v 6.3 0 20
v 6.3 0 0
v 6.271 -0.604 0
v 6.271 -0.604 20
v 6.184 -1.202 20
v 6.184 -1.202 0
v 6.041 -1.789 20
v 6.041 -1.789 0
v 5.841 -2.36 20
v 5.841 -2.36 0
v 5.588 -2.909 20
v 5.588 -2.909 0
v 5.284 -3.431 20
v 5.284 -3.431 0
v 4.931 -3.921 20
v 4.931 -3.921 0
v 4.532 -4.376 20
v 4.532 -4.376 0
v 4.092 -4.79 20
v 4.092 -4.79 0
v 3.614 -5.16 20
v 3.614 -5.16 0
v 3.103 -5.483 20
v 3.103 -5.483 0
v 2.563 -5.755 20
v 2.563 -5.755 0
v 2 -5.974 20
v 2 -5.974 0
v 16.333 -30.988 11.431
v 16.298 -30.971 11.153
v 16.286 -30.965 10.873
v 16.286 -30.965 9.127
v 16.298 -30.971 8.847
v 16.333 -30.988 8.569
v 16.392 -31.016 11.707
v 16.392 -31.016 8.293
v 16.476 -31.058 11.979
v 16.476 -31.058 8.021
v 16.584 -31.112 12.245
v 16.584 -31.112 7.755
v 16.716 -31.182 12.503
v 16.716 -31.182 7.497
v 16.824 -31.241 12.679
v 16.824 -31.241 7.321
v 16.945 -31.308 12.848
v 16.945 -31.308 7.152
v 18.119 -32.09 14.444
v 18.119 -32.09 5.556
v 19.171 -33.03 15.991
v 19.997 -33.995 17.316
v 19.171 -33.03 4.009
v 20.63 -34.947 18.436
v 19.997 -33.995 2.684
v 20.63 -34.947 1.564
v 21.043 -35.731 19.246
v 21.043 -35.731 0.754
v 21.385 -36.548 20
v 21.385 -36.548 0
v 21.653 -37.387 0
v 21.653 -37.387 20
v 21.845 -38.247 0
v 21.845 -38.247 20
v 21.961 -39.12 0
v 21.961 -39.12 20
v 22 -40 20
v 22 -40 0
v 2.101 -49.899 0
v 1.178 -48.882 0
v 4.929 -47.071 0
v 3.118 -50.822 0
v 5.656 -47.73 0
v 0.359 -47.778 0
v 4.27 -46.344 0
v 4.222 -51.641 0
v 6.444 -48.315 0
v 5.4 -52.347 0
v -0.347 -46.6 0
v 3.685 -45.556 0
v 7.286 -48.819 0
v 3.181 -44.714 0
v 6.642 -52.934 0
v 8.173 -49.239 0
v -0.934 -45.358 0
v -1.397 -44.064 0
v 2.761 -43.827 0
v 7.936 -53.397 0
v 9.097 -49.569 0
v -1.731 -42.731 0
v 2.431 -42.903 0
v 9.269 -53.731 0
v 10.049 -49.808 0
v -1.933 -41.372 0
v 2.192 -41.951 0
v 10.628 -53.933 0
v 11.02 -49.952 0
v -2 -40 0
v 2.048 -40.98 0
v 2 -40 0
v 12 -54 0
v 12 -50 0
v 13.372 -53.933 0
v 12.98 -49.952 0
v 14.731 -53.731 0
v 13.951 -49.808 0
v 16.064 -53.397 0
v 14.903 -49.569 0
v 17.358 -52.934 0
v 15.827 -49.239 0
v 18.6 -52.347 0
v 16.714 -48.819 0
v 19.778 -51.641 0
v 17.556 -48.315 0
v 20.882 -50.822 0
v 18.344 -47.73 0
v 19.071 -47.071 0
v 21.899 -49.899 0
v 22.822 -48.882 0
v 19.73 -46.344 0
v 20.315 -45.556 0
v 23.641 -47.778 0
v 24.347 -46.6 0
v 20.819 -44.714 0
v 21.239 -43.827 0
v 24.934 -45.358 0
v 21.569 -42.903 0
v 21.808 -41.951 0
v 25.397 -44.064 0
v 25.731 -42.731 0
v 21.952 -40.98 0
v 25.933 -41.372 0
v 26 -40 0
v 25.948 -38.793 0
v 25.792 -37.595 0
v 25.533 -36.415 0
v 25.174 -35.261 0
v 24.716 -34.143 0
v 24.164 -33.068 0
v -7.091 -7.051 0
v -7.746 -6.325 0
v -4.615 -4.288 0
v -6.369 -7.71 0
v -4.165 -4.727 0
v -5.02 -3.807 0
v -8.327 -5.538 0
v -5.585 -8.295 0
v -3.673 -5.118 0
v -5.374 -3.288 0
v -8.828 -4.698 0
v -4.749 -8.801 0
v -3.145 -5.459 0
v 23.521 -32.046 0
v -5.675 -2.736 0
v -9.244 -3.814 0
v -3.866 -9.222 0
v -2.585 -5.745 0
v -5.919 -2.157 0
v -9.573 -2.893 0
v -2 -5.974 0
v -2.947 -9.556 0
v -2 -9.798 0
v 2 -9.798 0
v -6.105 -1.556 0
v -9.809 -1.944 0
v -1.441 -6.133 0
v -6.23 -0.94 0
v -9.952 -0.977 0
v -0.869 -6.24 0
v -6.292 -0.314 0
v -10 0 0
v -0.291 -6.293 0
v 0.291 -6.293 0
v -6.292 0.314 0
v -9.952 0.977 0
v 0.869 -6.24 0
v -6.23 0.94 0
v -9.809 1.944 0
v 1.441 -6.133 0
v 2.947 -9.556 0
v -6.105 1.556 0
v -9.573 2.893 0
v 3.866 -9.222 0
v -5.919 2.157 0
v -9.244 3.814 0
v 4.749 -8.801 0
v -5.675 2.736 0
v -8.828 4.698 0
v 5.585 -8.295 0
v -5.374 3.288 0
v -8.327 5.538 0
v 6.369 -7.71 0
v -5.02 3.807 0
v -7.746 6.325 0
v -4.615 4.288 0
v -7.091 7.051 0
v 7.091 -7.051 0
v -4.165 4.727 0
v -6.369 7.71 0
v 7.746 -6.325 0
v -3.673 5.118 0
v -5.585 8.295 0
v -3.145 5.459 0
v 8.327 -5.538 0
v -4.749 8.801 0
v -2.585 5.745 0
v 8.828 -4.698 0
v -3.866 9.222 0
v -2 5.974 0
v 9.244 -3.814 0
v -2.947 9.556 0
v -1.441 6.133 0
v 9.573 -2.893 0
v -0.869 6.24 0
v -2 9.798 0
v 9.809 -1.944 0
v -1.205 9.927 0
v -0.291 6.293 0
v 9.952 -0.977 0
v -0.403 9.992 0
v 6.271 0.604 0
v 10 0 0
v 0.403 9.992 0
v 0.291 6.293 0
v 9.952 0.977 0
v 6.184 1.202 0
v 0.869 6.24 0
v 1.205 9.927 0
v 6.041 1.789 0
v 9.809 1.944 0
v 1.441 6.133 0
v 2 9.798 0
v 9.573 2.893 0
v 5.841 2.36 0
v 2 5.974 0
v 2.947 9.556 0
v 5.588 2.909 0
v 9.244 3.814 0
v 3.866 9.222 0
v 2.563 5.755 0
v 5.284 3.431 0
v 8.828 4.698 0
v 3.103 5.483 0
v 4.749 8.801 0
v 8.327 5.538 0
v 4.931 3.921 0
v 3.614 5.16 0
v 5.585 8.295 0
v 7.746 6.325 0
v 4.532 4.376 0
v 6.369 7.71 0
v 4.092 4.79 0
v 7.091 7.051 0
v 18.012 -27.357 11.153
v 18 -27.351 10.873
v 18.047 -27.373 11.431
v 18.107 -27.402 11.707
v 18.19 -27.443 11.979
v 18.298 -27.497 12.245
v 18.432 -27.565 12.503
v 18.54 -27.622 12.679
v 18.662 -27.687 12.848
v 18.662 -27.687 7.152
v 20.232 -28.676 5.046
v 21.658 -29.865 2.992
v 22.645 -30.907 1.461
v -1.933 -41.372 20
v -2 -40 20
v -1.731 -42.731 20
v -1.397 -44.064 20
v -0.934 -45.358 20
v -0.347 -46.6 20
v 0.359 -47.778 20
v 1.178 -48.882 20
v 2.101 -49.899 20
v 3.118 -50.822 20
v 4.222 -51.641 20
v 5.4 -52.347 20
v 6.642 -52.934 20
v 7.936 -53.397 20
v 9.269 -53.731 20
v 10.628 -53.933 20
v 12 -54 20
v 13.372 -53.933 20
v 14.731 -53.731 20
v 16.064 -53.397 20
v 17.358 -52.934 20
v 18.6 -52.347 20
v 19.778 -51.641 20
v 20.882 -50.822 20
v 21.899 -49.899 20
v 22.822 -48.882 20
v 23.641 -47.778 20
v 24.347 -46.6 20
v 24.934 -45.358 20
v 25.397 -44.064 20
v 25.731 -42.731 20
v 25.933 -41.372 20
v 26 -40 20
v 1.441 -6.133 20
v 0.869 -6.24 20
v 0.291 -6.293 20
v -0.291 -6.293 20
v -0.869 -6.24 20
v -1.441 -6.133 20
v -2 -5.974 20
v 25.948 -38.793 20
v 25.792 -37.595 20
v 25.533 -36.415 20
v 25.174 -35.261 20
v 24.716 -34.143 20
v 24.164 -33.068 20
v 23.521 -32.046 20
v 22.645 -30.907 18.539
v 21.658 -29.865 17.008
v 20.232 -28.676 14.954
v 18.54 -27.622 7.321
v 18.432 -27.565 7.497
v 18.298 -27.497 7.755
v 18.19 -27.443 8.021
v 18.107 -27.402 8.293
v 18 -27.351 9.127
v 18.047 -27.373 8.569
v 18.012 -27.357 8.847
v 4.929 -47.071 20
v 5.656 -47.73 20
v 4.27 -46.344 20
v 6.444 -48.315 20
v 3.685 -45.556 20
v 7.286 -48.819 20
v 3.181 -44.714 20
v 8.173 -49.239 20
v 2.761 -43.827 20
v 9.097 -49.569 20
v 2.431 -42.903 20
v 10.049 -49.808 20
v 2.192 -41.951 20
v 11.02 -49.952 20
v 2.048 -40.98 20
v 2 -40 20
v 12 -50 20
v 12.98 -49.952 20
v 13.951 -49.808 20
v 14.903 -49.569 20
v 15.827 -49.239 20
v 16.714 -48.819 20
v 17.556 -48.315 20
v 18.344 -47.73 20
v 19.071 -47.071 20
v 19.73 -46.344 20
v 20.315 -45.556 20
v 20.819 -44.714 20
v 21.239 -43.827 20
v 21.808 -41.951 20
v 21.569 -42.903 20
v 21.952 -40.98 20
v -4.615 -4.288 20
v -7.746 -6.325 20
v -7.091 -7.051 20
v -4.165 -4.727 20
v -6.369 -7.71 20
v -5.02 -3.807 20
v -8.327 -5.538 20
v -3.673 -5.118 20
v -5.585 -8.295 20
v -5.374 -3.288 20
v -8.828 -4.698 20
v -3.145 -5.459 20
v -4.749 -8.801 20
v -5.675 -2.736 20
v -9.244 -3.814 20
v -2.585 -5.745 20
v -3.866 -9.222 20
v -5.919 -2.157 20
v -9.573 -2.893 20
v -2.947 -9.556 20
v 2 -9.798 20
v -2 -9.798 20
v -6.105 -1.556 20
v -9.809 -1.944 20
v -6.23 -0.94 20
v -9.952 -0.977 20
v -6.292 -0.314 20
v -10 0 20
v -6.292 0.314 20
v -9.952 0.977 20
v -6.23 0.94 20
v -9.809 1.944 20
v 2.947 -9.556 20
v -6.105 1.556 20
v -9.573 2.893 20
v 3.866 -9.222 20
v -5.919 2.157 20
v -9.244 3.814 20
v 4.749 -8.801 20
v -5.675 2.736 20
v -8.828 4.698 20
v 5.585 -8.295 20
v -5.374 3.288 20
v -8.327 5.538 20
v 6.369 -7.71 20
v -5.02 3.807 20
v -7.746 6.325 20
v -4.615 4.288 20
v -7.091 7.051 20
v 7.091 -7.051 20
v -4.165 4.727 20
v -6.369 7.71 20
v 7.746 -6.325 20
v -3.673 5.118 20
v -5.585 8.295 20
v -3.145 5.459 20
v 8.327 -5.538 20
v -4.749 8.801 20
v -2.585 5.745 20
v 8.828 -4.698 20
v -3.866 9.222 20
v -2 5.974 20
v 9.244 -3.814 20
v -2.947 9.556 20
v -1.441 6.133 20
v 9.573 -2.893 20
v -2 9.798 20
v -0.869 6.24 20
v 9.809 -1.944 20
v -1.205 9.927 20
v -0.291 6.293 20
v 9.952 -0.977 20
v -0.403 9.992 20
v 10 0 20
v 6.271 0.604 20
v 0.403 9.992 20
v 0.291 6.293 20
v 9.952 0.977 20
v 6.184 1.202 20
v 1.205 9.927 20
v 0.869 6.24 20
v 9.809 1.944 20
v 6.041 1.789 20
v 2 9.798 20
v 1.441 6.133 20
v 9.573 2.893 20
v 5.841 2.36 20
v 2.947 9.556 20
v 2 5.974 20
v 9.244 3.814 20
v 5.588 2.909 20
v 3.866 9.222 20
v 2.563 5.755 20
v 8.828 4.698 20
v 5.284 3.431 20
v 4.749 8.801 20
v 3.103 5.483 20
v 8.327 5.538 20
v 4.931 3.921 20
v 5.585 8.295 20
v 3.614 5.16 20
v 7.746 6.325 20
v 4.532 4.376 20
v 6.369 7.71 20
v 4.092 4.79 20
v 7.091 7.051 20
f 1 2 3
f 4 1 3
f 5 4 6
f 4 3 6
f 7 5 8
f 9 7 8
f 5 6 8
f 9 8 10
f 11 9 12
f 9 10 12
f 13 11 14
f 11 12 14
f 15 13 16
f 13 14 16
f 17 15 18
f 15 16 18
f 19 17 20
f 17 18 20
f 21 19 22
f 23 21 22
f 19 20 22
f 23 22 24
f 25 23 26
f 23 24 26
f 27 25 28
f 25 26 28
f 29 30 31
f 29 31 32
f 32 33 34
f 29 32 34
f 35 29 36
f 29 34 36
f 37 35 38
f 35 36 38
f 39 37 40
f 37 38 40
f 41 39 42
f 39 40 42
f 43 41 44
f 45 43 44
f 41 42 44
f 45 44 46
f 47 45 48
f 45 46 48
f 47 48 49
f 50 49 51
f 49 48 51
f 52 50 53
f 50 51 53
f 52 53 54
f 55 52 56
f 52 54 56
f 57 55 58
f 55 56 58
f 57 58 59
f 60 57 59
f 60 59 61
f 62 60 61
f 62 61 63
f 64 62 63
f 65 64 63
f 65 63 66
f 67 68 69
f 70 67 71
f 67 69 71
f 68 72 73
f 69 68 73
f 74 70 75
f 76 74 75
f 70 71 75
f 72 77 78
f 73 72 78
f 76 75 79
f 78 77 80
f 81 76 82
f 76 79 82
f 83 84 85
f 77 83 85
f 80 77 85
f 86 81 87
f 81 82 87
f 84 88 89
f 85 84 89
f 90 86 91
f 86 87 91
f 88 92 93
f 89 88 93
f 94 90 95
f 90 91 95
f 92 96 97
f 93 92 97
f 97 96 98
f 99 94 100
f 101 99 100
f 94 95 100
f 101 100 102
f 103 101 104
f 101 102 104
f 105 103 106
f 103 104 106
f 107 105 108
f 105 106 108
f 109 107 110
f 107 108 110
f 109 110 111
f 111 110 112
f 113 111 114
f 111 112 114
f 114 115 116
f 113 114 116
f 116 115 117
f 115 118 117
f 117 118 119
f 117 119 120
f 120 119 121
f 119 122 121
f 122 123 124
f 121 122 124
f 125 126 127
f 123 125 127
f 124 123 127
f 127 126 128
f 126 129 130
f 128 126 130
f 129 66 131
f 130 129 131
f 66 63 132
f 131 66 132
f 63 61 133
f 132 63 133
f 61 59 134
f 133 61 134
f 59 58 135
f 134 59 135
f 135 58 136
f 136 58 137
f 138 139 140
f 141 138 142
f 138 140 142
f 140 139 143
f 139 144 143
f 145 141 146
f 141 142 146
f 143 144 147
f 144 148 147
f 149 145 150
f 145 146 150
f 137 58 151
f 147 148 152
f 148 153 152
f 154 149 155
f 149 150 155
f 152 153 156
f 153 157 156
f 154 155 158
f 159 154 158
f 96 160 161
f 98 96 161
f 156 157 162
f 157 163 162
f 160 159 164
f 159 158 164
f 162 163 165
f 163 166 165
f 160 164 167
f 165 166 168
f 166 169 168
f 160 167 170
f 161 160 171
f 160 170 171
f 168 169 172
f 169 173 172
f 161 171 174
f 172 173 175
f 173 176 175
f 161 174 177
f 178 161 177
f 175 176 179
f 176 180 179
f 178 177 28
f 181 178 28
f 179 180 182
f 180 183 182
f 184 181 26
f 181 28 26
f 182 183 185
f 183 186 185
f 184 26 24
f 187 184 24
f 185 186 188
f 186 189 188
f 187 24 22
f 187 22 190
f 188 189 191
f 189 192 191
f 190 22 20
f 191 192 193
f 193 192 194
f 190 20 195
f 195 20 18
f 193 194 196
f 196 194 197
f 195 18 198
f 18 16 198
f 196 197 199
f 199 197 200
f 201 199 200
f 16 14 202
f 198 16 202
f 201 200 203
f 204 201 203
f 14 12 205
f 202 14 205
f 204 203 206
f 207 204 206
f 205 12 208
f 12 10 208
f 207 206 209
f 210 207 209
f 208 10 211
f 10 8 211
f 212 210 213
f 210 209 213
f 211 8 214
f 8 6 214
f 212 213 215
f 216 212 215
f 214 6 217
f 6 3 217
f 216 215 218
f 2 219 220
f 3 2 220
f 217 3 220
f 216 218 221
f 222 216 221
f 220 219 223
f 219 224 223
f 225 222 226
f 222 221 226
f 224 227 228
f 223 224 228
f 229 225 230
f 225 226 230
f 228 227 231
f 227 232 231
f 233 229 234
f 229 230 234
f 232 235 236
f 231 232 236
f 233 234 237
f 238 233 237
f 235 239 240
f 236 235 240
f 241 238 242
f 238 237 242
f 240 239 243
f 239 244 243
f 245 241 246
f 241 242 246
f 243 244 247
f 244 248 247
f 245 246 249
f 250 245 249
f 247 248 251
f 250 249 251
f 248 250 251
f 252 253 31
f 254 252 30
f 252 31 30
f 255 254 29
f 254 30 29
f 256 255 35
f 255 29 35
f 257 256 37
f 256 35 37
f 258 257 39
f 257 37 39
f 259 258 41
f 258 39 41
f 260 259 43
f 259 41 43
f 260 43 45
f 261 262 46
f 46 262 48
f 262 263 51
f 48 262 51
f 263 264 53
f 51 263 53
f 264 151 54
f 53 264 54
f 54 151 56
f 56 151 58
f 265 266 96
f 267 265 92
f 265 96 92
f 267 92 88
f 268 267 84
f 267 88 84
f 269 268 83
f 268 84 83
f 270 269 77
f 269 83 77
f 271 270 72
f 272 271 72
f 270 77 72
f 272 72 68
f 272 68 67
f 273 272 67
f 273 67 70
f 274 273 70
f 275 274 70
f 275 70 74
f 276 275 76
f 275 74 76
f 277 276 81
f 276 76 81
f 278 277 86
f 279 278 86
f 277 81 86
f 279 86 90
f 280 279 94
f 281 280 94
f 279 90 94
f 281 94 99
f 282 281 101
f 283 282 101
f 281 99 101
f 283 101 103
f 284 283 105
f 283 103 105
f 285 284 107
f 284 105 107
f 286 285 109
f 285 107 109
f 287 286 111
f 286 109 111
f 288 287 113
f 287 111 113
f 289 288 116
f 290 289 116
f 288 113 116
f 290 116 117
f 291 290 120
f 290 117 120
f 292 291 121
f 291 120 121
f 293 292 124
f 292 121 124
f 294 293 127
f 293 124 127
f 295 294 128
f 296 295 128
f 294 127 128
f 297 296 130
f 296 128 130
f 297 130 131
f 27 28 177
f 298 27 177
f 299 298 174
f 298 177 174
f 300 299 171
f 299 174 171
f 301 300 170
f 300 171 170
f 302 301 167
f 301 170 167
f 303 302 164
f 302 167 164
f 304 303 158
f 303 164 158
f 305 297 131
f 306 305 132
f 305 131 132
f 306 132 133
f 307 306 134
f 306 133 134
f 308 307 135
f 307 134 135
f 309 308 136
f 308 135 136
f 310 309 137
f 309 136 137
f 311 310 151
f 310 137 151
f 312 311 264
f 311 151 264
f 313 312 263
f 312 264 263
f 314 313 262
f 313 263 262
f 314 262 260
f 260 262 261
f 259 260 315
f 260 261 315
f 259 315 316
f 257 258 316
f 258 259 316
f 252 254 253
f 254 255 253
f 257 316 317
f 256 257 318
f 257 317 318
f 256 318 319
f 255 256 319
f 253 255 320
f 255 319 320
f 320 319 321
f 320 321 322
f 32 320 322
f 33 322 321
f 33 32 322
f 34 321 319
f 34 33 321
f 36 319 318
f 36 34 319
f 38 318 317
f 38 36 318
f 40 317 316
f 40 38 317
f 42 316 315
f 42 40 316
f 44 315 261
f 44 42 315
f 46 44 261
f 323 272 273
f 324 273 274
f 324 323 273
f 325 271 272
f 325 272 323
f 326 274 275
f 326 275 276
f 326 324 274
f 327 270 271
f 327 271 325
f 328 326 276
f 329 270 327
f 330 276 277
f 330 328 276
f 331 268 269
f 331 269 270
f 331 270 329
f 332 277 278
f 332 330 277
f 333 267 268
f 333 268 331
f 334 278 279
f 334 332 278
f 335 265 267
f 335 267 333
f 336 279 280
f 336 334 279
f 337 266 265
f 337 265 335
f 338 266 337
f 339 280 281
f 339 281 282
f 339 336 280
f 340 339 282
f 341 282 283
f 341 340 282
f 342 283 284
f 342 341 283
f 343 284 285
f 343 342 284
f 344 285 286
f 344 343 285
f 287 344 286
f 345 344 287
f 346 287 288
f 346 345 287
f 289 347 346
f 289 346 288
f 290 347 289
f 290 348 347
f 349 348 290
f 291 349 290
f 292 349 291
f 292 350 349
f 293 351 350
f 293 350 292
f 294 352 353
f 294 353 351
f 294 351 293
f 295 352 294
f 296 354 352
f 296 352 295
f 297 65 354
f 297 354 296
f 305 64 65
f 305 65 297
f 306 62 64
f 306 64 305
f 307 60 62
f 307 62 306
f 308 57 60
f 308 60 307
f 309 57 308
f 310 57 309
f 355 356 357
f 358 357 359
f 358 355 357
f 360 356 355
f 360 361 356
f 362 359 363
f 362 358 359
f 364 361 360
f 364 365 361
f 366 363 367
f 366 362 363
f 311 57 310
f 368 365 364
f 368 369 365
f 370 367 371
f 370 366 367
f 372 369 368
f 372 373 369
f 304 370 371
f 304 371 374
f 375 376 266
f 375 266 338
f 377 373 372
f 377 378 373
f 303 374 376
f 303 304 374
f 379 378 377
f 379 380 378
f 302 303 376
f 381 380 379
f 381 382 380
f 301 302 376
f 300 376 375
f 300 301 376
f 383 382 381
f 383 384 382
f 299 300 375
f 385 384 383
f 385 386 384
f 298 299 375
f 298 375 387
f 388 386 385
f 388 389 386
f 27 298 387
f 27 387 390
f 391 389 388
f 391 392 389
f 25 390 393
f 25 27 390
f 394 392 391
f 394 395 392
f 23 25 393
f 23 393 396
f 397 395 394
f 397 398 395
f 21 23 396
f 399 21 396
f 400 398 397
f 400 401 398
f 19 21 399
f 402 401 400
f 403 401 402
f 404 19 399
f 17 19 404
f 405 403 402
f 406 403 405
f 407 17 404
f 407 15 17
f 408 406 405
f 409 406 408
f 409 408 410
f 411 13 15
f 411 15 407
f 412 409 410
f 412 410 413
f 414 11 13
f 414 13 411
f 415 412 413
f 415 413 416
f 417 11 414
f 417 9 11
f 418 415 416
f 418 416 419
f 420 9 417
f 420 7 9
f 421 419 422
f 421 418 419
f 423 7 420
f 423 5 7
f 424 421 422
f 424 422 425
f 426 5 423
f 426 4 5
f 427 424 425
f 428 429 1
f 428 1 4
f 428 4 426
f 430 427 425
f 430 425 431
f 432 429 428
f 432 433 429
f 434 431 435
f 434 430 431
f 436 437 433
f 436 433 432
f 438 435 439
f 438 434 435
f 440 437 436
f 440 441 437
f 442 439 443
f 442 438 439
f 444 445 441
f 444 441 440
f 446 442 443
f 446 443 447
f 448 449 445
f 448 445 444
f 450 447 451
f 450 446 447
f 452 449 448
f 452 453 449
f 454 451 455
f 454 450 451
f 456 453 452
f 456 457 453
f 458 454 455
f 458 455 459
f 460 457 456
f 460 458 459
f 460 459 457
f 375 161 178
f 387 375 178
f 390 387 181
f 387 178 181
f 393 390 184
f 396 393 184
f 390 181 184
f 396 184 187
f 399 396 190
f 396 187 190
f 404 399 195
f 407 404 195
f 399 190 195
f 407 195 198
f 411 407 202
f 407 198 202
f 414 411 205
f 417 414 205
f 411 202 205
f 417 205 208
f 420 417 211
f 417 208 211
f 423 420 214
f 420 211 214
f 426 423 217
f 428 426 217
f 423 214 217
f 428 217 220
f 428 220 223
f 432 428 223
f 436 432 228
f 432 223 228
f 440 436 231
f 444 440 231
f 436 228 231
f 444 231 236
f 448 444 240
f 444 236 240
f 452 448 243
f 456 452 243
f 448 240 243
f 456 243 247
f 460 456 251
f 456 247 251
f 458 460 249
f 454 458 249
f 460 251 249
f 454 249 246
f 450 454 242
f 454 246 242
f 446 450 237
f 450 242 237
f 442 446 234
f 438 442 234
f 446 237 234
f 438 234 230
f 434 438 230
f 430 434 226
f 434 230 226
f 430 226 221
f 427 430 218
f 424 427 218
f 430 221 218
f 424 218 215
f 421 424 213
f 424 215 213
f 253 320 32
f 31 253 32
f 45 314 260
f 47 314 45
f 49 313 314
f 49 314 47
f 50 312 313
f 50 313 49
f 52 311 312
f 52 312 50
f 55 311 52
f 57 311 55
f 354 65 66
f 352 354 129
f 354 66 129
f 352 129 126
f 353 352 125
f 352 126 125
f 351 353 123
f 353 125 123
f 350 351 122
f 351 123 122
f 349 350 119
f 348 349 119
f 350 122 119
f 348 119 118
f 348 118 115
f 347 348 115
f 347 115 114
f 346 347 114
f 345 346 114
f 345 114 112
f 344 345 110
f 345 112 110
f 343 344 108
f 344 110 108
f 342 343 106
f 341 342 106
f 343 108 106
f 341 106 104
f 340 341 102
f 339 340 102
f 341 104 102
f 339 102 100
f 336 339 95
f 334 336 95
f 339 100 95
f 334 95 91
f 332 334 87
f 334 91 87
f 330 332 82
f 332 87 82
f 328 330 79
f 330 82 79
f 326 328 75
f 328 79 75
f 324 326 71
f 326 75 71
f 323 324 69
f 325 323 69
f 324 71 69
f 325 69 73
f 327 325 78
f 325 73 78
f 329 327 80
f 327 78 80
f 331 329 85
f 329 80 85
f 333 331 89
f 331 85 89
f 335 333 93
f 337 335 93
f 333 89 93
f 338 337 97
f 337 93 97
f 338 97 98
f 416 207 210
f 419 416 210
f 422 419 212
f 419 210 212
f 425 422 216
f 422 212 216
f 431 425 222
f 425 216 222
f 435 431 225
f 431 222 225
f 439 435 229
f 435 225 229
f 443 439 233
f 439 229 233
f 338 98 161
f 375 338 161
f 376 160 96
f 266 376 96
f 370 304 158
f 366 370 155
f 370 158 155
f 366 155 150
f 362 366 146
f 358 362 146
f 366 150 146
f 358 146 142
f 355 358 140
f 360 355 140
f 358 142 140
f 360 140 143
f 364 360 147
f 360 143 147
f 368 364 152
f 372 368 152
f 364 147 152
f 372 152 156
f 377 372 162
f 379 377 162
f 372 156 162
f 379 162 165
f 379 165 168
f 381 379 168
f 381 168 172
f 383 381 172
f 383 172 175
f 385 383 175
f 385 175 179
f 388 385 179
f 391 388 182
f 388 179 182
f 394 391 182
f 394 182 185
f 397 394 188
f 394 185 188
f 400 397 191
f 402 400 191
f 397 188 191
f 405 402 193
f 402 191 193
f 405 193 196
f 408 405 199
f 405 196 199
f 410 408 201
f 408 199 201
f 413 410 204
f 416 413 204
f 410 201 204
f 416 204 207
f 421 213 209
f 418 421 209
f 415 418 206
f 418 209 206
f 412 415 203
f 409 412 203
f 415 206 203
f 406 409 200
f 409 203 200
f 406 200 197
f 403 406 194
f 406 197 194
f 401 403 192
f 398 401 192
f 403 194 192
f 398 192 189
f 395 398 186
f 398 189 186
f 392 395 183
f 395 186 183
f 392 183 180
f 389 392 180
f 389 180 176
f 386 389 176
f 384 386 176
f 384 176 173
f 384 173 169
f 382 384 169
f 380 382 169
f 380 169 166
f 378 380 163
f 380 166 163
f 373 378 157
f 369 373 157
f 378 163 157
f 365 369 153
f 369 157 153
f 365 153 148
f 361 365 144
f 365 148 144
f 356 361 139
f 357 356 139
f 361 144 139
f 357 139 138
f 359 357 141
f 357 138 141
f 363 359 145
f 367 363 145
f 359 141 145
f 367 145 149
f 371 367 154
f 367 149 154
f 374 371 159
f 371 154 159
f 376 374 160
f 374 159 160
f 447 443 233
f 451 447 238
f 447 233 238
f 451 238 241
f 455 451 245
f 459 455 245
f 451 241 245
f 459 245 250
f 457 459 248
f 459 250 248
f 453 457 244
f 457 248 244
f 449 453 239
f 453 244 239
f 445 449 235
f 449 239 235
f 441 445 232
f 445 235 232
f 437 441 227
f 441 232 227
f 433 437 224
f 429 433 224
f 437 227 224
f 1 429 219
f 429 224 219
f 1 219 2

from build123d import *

# Parameters (mm, degrees)
F1_DEPTH = 20
F2_SIZE2 = 7
F2_SIZE  = 8
F3_R     = 3


with BuildPart() as f1:
    # F0 (on Top) → F1 (new body)
    with BuildSketch(Plane.XY):
        with BuildLine():
            ThreePointArc((2, 5.9741108125), (5.1132181647, 3.6803532439), (6.3, 0))
            ThreePointArc((6.3, 0), (5.1132181647, -3.6803532439), (2, -5.9741108125))
            Line((2, -5.9741108125), (2, -9.7979589711))
            ThreePointArc((2, -9.7979589711), (7.7459666924, -6.3245553203), (10, 0))
            ThreePointArc((10, 0), (7.7459666924, 6.3245553203), (2, 9.7979589711))
            Line((2, 9.7979589711), (2, 5.9741108125))
        make_face()
        with BuildLine():
            ThreePointArc((-2, 5.9741108125), (0, 6.3), (2, 5.9741108125))
            Line((2, 5.9741108125), (2, 9.7979589711))
            ThreePointArc((2, 9.7979589711), (0, 10), (-2, 9.7979589711))
            Line((-2, 9.7979589711), (-2, 5.9741108125))
        make_face()
        with BuildLine():
            ThreePointArc((-2, -5.9741108125), (-6.3, 0), (-2, 5.9741108125))
            Line((-2, 5.9741108125), (-2, 9.7979589711))
            ThreePointArc((-2, 9.7979589711), (-10, 0), (-2, -9.7979589711))
            Line((-2, -9.7979589711), (-2, -5.9741108125))
        make_face()
        with BuildLine():
            Line((2, -9.7979589711), (2, -5.9741108125))
            ThreePointArc((2, -5.9741108125), (0, -6.3), (-2, -5.9741108125))
            Line((-2, -5.9741108125), (-2, -9.7979589711))
            ThreePointArc((-2, -9.7979589711), (0, -10), (2, -9.7979589711))
        make_face()
        with BuildLine():
            Line((2, -30.2020410289), (2, -9.7979589711))
            ThreePointArc((2, -9.7979589711), (0, -10), (-2, -9.7979589711))
            Line((-2, -9.7979589711), (-2, -40))
            ThreePointArc((-2, -40), (-0.9614813968, -34.7084973779), (2, -30.2020410289))
        make_face()
        with BuildLine():
            Line((2, -40), (2, -30.2020410289))
            ThreePointArc((2, -30.2020410289), (-0.9614813968, -34.7084973779), (-2, -40))
            Line((-2, -40), (2, -40))
        make_face()
        with BuildLine():
            Line((2, -40), (-2, -40))
            ThreePointArc((-2, -40), (12, -54), (26, -40))
            ThreePointArc((26, -40), (23.8321595662, -32.5166852265), (18, -27.3508893593))
            Line((18, -27.3508893593), (16.2857142857, -30.9649209709))
            ThreePointArc((16.2857142857, -30.9649209709), (20.4515425473, -34.6547751618), (22, -40))
            ThreePointArc((22, -40), (12, -50), (2, -40))
        make_face()
    extrude(amount=F1_DEPTH)

    # F2
    f2_edges = [f1.edges().sort_by_distance(p)[0] for p in [
        (17.142857, -29.157905, 20),
        (17.142857, -29.157905, 0),
    ]]
    f2_side = f1.faces().sort_by_distance((17.142857, -29.157905, 10))[0]
    chamfer(f2_edges, length=F2_SIZE, length2=F2_SIZE2, reference=f2_side)

    # F3
    f3_edges = [f1.edges().sort_by_distance(p)[0] for p in [
        (17.142857, -29.157905, 12),
        (17.142857, -29.157905, 8),
    ]]
    fillet(f3_edges, radius=F3_R)


solid = f1.part
